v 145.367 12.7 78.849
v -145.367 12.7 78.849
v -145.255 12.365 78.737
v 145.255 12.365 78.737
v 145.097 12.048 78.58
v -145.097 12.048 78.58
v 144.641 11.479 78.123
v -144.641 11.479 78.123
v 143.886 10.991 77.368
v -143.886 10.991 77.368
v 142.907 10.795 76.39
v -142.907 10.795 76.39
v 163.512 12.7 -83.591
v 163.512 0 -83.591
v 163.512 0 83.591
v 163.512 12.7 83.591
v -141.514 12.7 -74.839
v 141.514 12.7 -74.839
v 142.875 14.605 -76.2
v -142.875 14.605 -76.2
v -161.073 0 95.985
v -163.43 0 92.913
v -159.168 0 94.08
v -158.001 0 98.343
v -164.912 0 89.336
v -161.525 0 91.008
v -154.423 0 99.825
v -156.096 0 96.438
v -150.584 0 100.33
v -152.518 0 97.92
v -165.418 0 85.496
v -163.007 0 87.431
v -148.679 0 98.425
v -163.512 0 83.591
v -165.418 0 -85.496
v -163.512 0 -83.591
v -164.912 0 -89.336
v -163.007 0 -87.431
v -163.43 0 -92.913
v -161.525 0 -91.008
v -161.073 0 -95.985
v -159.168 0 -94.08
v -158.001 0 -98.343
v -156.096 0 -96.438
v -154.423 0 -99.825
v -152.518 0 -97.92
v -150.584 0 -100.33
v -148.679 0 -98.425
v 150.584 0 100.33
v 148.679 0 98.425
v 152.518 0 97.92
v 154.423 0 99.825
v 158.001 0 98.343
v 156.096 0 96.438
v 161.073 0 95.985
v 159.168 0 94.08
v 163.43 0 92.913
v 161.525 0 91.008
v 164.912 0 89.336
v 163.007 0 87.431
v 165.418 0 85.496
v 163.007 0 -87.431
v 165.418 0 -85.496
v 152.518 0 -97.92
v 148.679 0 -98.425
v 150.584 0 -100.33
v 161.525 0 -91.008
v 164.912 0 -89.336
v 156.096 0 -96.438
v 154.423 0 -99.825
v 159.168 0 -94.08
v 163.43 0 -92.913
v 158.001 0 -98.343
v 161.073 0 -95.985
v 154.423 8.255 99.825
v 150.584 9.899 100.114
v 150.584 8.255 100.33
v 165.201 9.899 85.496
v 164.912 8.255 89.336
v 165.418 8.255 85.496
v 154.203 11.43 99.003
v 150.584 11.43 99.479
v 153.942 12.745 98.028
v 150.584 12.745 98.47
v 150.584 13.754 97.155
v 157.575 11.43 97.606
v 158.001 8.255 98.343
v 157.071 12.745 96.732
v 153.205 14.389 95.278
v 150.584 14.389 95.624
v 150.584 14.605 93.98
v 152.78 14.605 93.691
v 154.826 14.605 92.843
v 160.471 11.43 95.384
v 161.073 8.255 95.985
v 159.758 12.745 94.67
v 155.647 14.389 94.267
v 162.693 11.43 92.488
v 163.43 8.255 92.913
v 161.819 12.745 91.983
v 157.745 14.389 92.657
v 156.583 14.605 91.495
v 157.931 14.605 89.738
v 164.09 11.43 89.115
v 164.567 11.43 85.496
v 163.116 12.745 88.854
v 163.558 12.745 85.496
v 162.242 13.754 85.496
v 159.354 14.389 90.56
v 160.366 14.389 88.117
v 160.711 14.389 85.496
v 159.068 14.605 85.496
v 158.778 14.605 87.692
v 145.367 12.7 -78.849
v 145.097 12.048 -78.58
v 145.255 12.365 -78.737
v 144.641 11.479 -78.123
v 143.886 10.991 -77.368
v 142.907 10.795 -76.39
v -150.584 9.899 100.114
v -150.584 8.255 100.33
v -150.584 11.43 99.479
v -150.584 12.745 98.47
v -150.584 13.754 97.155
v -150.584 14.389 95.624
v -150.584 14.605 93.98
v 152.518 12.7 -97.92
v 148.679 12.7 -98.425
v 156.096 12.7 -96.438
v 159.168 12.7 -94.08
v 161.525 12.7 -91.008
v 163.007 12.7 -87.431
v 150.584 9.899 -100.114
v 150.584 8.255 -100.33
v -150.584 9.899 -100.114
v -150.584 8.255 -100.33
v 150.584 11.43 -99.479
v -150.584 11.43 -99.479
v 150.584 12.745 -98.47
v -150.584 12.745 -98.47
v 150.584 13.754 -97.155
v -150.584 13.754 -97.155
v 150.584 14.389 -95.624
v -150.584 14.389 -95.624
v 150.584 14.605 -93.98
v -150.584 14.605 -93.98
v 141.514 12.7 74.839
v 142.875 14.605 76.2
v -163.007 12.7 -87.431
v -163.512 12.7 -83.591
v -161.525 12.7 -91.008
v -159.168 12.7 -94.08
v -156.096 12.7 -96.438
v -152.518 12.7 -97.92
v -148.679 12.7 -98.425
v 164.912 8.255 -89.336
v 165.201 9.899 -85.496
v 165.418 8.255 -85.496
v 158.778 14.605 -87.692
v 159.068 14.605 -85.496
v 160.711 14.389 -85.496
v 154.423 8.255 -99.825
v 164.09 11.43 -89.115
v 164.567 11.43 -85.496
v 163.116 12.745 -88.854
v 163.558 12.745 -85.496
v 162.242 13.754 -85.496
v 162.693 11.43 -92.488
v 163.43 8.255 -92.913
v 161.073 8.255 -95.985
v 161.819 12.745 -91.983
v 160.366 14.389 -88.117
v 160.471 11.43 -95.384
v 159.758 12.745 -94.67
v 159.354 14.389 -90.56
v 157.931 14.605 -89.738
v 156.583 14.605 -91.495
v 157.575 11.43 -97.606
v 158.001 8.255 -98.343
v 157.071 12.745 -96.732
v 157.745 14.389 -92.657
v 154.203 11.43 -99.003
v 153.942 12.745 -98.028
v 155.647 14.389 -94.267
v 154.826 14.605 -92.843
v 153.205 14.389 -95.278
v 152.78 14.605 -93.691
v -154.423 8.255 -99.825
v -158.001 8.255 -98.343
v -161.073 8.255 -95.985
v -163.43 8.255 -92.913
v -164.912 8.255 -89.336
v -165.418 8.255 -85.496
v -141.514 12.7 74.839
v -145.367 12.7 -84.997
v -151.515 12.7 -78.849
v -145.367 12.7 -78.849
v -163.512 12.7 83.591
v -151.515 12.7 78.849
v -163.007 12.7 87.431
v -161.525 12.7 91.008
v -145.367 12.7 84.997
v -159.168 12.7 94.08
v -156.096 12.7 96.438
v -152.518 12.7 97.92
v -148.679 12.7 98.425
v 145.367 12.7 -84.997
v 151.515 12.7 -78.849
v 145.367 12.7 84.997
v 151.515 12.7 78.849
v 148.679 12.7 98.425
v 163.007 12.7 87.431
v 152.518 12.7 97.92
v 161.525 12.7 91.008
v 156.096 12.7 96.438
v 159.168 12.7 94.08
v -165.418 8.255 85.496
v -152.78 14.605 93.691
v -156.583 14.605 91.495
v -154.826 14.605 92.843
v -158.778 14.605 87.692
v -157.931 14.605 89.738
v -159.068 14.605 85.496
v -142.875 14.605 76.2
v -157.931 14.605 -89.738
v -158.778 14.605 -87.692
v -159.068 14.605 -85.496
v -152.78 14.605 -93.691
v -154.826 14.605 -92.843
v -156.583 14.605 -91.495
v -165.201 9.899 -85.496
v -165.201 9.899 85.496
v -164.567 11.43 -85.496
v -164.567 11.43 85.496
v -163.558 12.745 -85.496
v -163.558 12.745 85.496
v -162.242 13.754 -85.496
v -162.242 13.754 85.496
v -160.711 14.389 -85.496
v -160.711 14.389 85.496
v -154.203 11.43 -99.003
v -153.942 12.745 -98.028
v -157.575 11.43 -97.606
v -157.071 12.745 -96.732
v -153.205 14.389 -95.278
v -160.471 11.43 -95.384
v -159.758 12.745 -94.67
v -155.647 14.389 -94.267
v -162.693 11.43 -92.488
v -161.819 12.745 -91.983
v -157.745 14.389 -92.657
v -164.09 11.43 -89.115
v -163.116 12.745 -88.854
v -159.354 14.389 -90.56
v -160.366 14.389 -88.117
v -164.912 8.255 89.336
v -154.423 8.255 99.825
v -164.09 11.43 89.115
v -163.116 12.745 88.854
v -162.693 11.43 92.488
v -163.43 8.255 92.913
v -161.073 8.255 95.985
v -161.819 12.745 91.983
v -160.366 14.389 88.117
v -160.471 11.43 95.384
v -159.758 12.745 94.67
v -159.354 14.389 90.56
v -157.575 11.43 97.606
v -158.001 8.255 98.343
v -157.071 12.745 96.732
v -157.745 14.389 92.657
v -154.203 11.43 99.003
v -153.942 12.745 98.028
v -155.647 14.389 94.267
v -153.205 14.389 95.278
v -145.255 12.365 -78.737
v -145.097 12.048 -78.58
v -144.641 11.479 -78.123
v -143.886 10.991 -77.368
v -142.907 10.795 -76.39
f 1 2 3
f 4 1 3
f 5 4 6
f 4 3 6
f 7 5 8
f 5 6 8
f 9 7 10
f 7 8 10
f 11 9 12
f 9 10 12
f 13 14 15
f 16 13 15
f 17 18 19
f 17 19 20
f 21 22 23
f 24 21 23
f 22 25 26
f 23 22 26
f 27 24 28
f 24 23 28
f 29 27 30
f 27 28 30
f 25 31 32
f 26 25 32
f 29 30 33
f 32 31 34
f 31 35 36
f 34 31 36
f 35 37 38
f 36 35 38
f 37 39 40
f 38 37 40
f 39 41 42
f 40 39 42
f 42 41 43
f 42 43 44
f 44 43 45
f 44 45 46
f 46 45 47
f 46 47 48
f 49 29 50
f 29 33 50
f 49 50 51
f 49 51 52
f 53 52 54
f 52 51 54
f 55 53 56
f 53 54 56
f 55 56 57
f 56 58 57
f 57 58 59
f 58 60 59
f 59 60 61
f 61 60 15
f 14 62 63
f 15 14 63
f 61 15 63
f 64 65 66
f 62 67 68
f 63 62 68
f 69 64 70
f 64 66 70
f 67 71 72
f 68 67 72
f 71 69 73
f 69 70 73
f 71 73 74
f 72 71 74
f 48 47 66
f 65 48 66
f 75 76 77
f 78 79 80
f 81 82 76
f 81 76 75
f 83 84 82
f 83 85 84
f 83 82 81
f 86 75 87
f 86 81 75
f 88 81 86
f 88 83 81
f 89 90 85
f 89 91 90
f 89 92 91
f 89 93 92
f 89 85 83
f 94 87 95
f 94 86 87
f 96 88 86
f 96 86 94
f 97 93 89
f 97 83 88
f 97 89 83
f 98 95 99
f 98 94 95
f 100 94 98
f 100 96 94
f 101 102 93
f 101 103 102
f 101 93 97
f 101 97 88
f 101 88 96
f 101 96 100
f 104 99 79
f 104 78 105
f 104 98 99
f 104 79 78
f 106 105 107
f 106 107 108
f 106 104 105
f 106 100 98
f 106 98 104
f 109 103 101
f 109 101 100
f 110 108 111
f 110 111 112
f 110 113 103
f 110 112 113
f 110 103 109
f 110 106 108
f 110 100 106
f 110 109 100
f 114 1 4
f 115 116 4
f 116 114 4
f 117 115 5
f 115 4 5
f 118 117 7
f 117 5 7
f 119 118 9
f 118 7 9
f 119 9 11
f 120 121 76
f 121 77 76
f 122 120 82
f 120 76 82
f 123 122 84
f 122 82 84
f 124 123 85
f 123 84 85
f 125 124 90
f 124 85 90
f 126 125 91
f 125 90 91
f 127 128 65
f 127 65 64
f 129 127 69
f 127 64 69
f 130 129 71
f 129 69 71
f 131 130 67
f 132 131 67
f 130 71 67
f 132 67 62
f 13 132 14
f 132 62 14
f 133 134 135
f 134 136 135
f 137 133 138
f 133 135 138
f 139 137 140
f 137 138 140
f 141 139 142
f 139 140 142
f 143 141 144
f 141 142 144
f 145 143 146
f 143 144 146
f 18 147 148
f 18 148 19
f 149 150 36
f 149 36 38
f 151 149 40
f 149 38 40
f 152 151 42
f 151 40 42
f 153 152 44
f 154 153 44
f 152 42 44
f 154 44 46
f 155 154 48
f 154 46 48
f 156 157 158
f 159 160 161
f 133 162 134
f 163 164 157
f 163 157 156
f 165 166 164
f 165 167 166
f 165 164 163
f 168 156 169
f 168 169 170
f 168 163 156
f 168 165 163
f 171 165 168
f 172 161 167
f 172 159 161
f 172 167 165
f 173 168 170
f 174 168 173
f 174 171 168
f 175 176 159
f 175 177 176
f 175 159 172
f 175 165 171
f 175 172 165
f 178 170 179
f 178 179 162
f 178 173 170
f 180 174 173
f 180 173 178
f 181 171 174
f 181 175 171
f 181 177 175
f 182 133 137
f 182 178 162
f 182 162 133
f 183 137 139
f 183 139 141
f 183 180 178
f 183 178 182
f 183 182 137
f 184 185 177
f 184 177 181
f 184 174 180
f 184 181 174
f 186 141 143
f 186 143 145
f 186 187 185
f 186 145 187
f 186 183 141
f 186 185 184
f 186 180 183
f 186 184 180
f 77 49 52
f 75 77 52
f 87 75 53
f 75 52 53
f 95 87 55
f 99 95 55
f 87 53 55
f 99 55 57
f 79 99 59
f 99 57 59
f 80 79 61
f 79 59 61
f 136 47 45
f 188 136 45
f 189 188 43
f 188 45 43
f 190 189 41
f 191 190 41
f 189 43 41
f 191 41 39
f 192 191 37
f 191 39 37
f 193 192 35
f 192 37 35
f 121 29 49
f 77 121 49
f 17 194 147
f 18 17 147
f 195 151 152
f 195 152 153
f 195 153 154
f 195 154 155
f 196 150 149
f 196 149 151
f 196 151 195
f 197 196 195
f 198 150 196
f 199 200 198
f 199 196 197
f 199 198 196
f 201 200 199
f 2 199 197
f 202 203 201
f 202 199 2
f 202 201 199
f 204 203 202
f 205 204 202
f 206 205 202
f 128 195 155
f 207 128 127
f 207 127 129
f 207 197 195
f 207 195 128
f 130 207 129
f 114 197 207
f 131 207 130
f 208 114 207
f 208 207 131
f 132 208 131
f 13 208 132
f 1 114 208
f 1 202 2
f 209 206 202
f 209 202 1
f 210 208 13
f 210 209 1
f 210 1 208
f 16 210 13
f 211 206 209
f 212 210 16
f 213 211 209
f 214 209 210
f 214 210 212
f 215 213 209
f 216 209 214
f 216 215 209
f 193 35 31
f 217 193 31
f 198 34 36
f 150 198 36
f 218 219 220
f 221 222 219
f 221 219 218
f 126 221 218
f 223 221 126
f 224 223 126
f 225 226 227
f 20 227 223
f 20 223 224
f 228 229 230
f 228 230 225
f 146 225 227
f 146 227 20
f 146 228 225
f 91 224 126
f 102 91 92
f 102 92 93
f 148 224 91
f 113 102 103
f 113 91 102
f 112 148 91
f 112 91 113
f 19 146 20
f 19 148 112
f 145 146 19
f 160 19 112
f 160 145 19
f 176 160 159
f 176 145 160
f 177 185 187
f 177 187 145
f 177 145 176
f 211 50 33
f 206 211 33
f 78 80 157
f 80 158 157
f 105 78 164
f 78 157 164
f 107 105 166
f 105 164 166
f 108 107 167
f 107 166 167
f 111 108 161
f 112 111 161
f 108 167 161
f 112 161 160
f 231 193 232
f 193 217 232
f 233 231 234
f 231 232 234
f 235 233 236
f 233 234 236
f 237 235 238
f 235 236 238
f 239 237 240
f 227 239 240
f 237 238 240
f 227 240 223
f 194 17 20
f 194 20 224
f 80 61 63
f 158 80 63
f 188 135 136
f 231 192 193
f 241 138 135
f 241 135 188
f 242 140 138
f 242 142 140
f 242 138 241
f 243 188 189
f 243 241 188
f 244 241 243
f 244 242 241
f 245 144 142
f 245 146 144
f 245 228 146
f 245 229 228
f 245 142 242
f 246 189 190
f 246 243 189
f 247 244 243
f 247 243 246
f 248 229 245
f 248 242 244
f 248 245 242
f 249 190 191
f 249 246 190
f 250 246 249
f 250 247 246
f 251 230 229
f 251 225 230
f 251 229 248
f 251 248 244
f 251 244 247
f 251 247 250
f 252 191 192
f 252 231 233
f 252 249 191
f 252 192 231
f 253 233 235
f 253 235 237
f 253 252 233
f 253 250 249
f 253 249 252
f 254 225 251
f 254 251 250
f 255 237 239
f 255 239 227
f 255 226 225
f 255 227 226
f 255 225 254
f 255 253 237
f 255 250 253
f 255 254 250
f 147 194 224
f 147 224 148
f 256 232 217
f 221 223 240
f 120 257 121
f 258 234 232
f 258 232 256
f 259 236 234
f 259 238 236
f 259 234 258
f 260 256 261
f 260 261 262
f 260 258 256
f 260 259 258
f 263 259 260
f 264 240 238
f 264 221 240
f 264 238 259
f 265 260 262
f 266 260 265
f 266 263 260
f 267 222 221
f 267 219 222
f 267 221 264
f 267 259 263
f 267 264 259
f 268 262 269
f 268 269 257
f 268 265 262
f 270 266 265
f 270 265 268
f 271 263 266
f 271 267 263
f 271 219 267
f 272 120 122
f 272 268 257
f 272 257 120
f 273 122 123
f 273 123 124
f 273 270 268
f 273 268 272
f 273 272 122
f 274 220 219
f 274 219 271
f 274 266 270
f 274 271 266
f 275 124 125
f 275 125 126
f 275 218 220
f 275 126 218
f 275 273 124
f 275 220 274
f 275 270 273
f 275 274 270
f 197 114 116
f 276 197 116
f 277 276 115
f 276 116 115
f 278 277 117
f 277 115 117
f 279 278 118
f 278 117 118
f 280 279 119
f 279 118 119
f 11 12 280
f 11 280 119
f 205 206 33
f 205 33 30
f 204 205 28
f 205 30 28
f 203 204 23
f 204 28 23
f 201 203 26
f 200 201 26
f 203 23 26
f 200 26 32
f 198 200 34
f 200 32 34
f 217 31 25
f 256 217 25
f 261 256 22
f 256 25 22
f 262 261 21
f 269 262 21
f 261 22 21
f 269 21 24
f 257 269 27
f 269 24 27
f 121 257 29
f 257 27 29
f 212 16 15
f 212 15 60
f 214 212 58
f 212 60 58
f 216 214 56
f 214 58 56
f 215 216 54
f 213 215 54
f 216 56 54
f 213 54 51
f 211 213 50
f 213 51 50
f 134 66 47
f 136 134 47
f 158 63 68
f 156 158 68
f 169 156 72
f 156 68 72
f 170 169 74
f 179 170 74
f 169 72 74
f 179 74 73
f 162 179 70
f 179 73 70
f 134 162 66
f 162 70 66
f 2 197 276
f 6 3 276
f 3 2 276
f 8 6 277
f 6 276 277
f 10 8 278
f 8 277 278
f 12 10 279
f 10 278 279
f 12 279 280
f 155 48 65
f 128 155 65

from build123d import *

# Parameters (mm, degrees)
BOSS_EXTRUDE1_DEPTH = 14.605
FILLET1_R           = 6.35
CUT_EXTRUDE1_DEPTH  = 12.7
SKETCH5_W           = 290.733643468
SKETCH5_H           = 157.6979616
BOSS_EXTRUDE2_DEPTH = 1.905
FILLET2_R           = 2.54


with BuildPart() as part:
    # Sketch1 → Boss-Extrude1 (new body)
    with BuildSketch(Plane(origin=(0, 0, 0), x_dir=(1, 0, 0), z_dir=(0, 1, 0))):
        with BuildLine():
            Line((-150.5839, -100.33), (150.5839, -100.33))
            ThreePointArc((150.5839, -100.33), (161.072839149, -95.985339149), (165.4175, -85.4964))
            Line((165.4175, -85.4964), (165.4175, 85.4964))
            ThreePointArc((165.4175, 85.4964), (161.072839149, 95.985339149), (150.5839, 100.33))
            Line((150.5839, 100.33), (-150.5839, 100.33))
            ThreePointArc((-150.5839, 100.33), (-161.072839149, 95.985339149), (-165.4175, 85.4964))
            Line((-165.4175, 85.4964), (-165.4175, -85.4964))
            ThreePointArc((-165.4175, -85.4964), (-161.072839149, -95.985339149), (-150.5839, -100.33))
        make_face()
    extrude(amount=BOSS_EXTRUDE1_DEPTH)

    # Fillet1
    fillet1_edges = [part.edges().sort_by_distance(p)[0] for p in [
        (161.072839149, 14.605, -95.985339149),
        (0, 14.605, -100.33),
        (-161.072839149, 14.605, -95.985339149),
        (-165.4175, 14.605, 0),
        (-161.072839149, 14.605, 95.985339149),
        (0, 14.605, 100.33),
        (161.072839149, 14.605, 95.985339149),
        (165.4175, 14.605, 0),
    ]]
    fillet(fillet1_edges, radius=FILLET1_R)

    # Sketch2 → Cut-Extrude1 (cut)
    with BuildSketch(Plane.XZ):
        with BuildLine():
            Line((-148.6789, -98.425), (148.6789, -98.425))
            ThreePointArc((148.6789, -98.425), (159.167839149, -94.080339149), (163.5125, -83.5914))
            Line((163.5125, -83.5914), (163.5125, 83.5914))
            ThreePointArc((163.5125, 83.5914), (159.167839149, 94.080339149), (148.6789, 98.425))
            Line((148.6789, 98.425), (-148.6789, 98.425))
            ThreePointArc((-148.6789, 98.425), (-159.167839149, 94.080339149), (-163.5125, 83.5914))
            Line((-163.5125, 83.5914), (-163.5125, -83.5914))
            ThreePointArc((-163.5125, -83.5914), (-159.167839149, -94.080339149), (-148.6789, -98.425))
        make_face()
    extrude(amount=-CUT_EXTRUDE1_DEPTH, mode=Mode.SUBTRACT)

    # Sketch3 → Cut-Loft1 section 0
    with BuildSketch(Plane(origin=(0, 14.605, 0), x_dir=(1, 0, 0), z_dir=(0, 1, 0))):
        with BuildLine():
            Line((-142.875, -76.2), (142.875, -76.2))
            Line((142.875, -76.2), (142.875, 76.2))
            Line((142.875, 76.2), (-142.875, 76.2))
            Line((-142.875, 76.2), (-142.875, -76.2))
        make_face()
    # Sketch4 → Cut-Loft1 section 1
    with BuildSketch(Plane(origin=(0, 10.16, 0), x_dir=(1, 0, 0), z_dir=(0, 1, 0))):
        with BuildLine():
            Line((-139.7, -73.025), (139.7, -73.025))
            Line((139.7, -73.025), (139.7, 73.025))
            Line((139.7, 73.025), (-139.7, 73.025))
            Line((-139.7, 73.025), (-139.7, -73.025))
        make_face()
    loft(mode=Mode.SUBTRACT)

    # Sketch5 → Boss-Extrude2 (add)
    with BuildSketch(Plane.XZ.offset(-12.7)):
        Rectangle(SKETCH5_W, SKETCH5_H)
    extrude(amount=BOSS_EXTRUDE2_DEPTH)

    # Fillet2
    # the kernel refuses this fillet: 2.54 mm, written as the material it takes off along each edge
    with BuildSketch(Plane(origin=(151.515182796, 10.795, -78.8489808), x_dir=(0, 1, 0), z_dir=(-1, 0, 0)), Plane(origin=(-151.515182796, 10.795, 78.8489808), x_dir=(0, 1, 0), z_dir=(1, 0, 0))) as fillet2_piece_1:
        with BuildLine():
            CenterArc((2.54, -2.459344425), FILLET2_R, 104.477512186, 75.522487814)
            Line((0, -2.459344425), (-0.0508, -2.459344425))
            Line((-0.0508, -2.459344425), (-0.0508, 0))
            Line((-0.0508, 0), (0, 0.0508))
            ThreePointArc((0, 0.0508), (0.9525, 0.0508), (1.8923, 0.049186888))
            Line((1.8923, 0.049186888), (1.905, 0))
        make_face()
    extrude(amount=303.030365593, mode=Mode.SUBTRACT)
    with BuildSketch(Plane(origin=(-145.366821734, 10.795, -84.997341863), x_dir=(0, 1, 0), z_dir=(0, 0, 1)), Plane(origin=(145.366821734, 10.795, 84.997341863), x_dir=(0, 1, 0), z_dir=(0, 0, -1))) as fillet2_piece_2:
        with BuildLine():
            CenterArc((2.54, -2.459344425), FILLET2_R, 104.477512186, 75.522487814)
            Line((0, -2.459344425), (-0.0508, -2.459344425))
            Line((-0.0508, -2.459344425), (-0.0508, 0))
            Line((-0.0508, 0), (0, 0.0508))
            ThreePointArc((0, 0.0508), (0.9525, 0.0508), (1.8923, 0.049186888))
            Line((1.8923, 0.049186888), (1.905, 0))
        make_face()
    extrude(amount=169.994683725, mode=Mode.SUBTRACT)


solid = part.part
